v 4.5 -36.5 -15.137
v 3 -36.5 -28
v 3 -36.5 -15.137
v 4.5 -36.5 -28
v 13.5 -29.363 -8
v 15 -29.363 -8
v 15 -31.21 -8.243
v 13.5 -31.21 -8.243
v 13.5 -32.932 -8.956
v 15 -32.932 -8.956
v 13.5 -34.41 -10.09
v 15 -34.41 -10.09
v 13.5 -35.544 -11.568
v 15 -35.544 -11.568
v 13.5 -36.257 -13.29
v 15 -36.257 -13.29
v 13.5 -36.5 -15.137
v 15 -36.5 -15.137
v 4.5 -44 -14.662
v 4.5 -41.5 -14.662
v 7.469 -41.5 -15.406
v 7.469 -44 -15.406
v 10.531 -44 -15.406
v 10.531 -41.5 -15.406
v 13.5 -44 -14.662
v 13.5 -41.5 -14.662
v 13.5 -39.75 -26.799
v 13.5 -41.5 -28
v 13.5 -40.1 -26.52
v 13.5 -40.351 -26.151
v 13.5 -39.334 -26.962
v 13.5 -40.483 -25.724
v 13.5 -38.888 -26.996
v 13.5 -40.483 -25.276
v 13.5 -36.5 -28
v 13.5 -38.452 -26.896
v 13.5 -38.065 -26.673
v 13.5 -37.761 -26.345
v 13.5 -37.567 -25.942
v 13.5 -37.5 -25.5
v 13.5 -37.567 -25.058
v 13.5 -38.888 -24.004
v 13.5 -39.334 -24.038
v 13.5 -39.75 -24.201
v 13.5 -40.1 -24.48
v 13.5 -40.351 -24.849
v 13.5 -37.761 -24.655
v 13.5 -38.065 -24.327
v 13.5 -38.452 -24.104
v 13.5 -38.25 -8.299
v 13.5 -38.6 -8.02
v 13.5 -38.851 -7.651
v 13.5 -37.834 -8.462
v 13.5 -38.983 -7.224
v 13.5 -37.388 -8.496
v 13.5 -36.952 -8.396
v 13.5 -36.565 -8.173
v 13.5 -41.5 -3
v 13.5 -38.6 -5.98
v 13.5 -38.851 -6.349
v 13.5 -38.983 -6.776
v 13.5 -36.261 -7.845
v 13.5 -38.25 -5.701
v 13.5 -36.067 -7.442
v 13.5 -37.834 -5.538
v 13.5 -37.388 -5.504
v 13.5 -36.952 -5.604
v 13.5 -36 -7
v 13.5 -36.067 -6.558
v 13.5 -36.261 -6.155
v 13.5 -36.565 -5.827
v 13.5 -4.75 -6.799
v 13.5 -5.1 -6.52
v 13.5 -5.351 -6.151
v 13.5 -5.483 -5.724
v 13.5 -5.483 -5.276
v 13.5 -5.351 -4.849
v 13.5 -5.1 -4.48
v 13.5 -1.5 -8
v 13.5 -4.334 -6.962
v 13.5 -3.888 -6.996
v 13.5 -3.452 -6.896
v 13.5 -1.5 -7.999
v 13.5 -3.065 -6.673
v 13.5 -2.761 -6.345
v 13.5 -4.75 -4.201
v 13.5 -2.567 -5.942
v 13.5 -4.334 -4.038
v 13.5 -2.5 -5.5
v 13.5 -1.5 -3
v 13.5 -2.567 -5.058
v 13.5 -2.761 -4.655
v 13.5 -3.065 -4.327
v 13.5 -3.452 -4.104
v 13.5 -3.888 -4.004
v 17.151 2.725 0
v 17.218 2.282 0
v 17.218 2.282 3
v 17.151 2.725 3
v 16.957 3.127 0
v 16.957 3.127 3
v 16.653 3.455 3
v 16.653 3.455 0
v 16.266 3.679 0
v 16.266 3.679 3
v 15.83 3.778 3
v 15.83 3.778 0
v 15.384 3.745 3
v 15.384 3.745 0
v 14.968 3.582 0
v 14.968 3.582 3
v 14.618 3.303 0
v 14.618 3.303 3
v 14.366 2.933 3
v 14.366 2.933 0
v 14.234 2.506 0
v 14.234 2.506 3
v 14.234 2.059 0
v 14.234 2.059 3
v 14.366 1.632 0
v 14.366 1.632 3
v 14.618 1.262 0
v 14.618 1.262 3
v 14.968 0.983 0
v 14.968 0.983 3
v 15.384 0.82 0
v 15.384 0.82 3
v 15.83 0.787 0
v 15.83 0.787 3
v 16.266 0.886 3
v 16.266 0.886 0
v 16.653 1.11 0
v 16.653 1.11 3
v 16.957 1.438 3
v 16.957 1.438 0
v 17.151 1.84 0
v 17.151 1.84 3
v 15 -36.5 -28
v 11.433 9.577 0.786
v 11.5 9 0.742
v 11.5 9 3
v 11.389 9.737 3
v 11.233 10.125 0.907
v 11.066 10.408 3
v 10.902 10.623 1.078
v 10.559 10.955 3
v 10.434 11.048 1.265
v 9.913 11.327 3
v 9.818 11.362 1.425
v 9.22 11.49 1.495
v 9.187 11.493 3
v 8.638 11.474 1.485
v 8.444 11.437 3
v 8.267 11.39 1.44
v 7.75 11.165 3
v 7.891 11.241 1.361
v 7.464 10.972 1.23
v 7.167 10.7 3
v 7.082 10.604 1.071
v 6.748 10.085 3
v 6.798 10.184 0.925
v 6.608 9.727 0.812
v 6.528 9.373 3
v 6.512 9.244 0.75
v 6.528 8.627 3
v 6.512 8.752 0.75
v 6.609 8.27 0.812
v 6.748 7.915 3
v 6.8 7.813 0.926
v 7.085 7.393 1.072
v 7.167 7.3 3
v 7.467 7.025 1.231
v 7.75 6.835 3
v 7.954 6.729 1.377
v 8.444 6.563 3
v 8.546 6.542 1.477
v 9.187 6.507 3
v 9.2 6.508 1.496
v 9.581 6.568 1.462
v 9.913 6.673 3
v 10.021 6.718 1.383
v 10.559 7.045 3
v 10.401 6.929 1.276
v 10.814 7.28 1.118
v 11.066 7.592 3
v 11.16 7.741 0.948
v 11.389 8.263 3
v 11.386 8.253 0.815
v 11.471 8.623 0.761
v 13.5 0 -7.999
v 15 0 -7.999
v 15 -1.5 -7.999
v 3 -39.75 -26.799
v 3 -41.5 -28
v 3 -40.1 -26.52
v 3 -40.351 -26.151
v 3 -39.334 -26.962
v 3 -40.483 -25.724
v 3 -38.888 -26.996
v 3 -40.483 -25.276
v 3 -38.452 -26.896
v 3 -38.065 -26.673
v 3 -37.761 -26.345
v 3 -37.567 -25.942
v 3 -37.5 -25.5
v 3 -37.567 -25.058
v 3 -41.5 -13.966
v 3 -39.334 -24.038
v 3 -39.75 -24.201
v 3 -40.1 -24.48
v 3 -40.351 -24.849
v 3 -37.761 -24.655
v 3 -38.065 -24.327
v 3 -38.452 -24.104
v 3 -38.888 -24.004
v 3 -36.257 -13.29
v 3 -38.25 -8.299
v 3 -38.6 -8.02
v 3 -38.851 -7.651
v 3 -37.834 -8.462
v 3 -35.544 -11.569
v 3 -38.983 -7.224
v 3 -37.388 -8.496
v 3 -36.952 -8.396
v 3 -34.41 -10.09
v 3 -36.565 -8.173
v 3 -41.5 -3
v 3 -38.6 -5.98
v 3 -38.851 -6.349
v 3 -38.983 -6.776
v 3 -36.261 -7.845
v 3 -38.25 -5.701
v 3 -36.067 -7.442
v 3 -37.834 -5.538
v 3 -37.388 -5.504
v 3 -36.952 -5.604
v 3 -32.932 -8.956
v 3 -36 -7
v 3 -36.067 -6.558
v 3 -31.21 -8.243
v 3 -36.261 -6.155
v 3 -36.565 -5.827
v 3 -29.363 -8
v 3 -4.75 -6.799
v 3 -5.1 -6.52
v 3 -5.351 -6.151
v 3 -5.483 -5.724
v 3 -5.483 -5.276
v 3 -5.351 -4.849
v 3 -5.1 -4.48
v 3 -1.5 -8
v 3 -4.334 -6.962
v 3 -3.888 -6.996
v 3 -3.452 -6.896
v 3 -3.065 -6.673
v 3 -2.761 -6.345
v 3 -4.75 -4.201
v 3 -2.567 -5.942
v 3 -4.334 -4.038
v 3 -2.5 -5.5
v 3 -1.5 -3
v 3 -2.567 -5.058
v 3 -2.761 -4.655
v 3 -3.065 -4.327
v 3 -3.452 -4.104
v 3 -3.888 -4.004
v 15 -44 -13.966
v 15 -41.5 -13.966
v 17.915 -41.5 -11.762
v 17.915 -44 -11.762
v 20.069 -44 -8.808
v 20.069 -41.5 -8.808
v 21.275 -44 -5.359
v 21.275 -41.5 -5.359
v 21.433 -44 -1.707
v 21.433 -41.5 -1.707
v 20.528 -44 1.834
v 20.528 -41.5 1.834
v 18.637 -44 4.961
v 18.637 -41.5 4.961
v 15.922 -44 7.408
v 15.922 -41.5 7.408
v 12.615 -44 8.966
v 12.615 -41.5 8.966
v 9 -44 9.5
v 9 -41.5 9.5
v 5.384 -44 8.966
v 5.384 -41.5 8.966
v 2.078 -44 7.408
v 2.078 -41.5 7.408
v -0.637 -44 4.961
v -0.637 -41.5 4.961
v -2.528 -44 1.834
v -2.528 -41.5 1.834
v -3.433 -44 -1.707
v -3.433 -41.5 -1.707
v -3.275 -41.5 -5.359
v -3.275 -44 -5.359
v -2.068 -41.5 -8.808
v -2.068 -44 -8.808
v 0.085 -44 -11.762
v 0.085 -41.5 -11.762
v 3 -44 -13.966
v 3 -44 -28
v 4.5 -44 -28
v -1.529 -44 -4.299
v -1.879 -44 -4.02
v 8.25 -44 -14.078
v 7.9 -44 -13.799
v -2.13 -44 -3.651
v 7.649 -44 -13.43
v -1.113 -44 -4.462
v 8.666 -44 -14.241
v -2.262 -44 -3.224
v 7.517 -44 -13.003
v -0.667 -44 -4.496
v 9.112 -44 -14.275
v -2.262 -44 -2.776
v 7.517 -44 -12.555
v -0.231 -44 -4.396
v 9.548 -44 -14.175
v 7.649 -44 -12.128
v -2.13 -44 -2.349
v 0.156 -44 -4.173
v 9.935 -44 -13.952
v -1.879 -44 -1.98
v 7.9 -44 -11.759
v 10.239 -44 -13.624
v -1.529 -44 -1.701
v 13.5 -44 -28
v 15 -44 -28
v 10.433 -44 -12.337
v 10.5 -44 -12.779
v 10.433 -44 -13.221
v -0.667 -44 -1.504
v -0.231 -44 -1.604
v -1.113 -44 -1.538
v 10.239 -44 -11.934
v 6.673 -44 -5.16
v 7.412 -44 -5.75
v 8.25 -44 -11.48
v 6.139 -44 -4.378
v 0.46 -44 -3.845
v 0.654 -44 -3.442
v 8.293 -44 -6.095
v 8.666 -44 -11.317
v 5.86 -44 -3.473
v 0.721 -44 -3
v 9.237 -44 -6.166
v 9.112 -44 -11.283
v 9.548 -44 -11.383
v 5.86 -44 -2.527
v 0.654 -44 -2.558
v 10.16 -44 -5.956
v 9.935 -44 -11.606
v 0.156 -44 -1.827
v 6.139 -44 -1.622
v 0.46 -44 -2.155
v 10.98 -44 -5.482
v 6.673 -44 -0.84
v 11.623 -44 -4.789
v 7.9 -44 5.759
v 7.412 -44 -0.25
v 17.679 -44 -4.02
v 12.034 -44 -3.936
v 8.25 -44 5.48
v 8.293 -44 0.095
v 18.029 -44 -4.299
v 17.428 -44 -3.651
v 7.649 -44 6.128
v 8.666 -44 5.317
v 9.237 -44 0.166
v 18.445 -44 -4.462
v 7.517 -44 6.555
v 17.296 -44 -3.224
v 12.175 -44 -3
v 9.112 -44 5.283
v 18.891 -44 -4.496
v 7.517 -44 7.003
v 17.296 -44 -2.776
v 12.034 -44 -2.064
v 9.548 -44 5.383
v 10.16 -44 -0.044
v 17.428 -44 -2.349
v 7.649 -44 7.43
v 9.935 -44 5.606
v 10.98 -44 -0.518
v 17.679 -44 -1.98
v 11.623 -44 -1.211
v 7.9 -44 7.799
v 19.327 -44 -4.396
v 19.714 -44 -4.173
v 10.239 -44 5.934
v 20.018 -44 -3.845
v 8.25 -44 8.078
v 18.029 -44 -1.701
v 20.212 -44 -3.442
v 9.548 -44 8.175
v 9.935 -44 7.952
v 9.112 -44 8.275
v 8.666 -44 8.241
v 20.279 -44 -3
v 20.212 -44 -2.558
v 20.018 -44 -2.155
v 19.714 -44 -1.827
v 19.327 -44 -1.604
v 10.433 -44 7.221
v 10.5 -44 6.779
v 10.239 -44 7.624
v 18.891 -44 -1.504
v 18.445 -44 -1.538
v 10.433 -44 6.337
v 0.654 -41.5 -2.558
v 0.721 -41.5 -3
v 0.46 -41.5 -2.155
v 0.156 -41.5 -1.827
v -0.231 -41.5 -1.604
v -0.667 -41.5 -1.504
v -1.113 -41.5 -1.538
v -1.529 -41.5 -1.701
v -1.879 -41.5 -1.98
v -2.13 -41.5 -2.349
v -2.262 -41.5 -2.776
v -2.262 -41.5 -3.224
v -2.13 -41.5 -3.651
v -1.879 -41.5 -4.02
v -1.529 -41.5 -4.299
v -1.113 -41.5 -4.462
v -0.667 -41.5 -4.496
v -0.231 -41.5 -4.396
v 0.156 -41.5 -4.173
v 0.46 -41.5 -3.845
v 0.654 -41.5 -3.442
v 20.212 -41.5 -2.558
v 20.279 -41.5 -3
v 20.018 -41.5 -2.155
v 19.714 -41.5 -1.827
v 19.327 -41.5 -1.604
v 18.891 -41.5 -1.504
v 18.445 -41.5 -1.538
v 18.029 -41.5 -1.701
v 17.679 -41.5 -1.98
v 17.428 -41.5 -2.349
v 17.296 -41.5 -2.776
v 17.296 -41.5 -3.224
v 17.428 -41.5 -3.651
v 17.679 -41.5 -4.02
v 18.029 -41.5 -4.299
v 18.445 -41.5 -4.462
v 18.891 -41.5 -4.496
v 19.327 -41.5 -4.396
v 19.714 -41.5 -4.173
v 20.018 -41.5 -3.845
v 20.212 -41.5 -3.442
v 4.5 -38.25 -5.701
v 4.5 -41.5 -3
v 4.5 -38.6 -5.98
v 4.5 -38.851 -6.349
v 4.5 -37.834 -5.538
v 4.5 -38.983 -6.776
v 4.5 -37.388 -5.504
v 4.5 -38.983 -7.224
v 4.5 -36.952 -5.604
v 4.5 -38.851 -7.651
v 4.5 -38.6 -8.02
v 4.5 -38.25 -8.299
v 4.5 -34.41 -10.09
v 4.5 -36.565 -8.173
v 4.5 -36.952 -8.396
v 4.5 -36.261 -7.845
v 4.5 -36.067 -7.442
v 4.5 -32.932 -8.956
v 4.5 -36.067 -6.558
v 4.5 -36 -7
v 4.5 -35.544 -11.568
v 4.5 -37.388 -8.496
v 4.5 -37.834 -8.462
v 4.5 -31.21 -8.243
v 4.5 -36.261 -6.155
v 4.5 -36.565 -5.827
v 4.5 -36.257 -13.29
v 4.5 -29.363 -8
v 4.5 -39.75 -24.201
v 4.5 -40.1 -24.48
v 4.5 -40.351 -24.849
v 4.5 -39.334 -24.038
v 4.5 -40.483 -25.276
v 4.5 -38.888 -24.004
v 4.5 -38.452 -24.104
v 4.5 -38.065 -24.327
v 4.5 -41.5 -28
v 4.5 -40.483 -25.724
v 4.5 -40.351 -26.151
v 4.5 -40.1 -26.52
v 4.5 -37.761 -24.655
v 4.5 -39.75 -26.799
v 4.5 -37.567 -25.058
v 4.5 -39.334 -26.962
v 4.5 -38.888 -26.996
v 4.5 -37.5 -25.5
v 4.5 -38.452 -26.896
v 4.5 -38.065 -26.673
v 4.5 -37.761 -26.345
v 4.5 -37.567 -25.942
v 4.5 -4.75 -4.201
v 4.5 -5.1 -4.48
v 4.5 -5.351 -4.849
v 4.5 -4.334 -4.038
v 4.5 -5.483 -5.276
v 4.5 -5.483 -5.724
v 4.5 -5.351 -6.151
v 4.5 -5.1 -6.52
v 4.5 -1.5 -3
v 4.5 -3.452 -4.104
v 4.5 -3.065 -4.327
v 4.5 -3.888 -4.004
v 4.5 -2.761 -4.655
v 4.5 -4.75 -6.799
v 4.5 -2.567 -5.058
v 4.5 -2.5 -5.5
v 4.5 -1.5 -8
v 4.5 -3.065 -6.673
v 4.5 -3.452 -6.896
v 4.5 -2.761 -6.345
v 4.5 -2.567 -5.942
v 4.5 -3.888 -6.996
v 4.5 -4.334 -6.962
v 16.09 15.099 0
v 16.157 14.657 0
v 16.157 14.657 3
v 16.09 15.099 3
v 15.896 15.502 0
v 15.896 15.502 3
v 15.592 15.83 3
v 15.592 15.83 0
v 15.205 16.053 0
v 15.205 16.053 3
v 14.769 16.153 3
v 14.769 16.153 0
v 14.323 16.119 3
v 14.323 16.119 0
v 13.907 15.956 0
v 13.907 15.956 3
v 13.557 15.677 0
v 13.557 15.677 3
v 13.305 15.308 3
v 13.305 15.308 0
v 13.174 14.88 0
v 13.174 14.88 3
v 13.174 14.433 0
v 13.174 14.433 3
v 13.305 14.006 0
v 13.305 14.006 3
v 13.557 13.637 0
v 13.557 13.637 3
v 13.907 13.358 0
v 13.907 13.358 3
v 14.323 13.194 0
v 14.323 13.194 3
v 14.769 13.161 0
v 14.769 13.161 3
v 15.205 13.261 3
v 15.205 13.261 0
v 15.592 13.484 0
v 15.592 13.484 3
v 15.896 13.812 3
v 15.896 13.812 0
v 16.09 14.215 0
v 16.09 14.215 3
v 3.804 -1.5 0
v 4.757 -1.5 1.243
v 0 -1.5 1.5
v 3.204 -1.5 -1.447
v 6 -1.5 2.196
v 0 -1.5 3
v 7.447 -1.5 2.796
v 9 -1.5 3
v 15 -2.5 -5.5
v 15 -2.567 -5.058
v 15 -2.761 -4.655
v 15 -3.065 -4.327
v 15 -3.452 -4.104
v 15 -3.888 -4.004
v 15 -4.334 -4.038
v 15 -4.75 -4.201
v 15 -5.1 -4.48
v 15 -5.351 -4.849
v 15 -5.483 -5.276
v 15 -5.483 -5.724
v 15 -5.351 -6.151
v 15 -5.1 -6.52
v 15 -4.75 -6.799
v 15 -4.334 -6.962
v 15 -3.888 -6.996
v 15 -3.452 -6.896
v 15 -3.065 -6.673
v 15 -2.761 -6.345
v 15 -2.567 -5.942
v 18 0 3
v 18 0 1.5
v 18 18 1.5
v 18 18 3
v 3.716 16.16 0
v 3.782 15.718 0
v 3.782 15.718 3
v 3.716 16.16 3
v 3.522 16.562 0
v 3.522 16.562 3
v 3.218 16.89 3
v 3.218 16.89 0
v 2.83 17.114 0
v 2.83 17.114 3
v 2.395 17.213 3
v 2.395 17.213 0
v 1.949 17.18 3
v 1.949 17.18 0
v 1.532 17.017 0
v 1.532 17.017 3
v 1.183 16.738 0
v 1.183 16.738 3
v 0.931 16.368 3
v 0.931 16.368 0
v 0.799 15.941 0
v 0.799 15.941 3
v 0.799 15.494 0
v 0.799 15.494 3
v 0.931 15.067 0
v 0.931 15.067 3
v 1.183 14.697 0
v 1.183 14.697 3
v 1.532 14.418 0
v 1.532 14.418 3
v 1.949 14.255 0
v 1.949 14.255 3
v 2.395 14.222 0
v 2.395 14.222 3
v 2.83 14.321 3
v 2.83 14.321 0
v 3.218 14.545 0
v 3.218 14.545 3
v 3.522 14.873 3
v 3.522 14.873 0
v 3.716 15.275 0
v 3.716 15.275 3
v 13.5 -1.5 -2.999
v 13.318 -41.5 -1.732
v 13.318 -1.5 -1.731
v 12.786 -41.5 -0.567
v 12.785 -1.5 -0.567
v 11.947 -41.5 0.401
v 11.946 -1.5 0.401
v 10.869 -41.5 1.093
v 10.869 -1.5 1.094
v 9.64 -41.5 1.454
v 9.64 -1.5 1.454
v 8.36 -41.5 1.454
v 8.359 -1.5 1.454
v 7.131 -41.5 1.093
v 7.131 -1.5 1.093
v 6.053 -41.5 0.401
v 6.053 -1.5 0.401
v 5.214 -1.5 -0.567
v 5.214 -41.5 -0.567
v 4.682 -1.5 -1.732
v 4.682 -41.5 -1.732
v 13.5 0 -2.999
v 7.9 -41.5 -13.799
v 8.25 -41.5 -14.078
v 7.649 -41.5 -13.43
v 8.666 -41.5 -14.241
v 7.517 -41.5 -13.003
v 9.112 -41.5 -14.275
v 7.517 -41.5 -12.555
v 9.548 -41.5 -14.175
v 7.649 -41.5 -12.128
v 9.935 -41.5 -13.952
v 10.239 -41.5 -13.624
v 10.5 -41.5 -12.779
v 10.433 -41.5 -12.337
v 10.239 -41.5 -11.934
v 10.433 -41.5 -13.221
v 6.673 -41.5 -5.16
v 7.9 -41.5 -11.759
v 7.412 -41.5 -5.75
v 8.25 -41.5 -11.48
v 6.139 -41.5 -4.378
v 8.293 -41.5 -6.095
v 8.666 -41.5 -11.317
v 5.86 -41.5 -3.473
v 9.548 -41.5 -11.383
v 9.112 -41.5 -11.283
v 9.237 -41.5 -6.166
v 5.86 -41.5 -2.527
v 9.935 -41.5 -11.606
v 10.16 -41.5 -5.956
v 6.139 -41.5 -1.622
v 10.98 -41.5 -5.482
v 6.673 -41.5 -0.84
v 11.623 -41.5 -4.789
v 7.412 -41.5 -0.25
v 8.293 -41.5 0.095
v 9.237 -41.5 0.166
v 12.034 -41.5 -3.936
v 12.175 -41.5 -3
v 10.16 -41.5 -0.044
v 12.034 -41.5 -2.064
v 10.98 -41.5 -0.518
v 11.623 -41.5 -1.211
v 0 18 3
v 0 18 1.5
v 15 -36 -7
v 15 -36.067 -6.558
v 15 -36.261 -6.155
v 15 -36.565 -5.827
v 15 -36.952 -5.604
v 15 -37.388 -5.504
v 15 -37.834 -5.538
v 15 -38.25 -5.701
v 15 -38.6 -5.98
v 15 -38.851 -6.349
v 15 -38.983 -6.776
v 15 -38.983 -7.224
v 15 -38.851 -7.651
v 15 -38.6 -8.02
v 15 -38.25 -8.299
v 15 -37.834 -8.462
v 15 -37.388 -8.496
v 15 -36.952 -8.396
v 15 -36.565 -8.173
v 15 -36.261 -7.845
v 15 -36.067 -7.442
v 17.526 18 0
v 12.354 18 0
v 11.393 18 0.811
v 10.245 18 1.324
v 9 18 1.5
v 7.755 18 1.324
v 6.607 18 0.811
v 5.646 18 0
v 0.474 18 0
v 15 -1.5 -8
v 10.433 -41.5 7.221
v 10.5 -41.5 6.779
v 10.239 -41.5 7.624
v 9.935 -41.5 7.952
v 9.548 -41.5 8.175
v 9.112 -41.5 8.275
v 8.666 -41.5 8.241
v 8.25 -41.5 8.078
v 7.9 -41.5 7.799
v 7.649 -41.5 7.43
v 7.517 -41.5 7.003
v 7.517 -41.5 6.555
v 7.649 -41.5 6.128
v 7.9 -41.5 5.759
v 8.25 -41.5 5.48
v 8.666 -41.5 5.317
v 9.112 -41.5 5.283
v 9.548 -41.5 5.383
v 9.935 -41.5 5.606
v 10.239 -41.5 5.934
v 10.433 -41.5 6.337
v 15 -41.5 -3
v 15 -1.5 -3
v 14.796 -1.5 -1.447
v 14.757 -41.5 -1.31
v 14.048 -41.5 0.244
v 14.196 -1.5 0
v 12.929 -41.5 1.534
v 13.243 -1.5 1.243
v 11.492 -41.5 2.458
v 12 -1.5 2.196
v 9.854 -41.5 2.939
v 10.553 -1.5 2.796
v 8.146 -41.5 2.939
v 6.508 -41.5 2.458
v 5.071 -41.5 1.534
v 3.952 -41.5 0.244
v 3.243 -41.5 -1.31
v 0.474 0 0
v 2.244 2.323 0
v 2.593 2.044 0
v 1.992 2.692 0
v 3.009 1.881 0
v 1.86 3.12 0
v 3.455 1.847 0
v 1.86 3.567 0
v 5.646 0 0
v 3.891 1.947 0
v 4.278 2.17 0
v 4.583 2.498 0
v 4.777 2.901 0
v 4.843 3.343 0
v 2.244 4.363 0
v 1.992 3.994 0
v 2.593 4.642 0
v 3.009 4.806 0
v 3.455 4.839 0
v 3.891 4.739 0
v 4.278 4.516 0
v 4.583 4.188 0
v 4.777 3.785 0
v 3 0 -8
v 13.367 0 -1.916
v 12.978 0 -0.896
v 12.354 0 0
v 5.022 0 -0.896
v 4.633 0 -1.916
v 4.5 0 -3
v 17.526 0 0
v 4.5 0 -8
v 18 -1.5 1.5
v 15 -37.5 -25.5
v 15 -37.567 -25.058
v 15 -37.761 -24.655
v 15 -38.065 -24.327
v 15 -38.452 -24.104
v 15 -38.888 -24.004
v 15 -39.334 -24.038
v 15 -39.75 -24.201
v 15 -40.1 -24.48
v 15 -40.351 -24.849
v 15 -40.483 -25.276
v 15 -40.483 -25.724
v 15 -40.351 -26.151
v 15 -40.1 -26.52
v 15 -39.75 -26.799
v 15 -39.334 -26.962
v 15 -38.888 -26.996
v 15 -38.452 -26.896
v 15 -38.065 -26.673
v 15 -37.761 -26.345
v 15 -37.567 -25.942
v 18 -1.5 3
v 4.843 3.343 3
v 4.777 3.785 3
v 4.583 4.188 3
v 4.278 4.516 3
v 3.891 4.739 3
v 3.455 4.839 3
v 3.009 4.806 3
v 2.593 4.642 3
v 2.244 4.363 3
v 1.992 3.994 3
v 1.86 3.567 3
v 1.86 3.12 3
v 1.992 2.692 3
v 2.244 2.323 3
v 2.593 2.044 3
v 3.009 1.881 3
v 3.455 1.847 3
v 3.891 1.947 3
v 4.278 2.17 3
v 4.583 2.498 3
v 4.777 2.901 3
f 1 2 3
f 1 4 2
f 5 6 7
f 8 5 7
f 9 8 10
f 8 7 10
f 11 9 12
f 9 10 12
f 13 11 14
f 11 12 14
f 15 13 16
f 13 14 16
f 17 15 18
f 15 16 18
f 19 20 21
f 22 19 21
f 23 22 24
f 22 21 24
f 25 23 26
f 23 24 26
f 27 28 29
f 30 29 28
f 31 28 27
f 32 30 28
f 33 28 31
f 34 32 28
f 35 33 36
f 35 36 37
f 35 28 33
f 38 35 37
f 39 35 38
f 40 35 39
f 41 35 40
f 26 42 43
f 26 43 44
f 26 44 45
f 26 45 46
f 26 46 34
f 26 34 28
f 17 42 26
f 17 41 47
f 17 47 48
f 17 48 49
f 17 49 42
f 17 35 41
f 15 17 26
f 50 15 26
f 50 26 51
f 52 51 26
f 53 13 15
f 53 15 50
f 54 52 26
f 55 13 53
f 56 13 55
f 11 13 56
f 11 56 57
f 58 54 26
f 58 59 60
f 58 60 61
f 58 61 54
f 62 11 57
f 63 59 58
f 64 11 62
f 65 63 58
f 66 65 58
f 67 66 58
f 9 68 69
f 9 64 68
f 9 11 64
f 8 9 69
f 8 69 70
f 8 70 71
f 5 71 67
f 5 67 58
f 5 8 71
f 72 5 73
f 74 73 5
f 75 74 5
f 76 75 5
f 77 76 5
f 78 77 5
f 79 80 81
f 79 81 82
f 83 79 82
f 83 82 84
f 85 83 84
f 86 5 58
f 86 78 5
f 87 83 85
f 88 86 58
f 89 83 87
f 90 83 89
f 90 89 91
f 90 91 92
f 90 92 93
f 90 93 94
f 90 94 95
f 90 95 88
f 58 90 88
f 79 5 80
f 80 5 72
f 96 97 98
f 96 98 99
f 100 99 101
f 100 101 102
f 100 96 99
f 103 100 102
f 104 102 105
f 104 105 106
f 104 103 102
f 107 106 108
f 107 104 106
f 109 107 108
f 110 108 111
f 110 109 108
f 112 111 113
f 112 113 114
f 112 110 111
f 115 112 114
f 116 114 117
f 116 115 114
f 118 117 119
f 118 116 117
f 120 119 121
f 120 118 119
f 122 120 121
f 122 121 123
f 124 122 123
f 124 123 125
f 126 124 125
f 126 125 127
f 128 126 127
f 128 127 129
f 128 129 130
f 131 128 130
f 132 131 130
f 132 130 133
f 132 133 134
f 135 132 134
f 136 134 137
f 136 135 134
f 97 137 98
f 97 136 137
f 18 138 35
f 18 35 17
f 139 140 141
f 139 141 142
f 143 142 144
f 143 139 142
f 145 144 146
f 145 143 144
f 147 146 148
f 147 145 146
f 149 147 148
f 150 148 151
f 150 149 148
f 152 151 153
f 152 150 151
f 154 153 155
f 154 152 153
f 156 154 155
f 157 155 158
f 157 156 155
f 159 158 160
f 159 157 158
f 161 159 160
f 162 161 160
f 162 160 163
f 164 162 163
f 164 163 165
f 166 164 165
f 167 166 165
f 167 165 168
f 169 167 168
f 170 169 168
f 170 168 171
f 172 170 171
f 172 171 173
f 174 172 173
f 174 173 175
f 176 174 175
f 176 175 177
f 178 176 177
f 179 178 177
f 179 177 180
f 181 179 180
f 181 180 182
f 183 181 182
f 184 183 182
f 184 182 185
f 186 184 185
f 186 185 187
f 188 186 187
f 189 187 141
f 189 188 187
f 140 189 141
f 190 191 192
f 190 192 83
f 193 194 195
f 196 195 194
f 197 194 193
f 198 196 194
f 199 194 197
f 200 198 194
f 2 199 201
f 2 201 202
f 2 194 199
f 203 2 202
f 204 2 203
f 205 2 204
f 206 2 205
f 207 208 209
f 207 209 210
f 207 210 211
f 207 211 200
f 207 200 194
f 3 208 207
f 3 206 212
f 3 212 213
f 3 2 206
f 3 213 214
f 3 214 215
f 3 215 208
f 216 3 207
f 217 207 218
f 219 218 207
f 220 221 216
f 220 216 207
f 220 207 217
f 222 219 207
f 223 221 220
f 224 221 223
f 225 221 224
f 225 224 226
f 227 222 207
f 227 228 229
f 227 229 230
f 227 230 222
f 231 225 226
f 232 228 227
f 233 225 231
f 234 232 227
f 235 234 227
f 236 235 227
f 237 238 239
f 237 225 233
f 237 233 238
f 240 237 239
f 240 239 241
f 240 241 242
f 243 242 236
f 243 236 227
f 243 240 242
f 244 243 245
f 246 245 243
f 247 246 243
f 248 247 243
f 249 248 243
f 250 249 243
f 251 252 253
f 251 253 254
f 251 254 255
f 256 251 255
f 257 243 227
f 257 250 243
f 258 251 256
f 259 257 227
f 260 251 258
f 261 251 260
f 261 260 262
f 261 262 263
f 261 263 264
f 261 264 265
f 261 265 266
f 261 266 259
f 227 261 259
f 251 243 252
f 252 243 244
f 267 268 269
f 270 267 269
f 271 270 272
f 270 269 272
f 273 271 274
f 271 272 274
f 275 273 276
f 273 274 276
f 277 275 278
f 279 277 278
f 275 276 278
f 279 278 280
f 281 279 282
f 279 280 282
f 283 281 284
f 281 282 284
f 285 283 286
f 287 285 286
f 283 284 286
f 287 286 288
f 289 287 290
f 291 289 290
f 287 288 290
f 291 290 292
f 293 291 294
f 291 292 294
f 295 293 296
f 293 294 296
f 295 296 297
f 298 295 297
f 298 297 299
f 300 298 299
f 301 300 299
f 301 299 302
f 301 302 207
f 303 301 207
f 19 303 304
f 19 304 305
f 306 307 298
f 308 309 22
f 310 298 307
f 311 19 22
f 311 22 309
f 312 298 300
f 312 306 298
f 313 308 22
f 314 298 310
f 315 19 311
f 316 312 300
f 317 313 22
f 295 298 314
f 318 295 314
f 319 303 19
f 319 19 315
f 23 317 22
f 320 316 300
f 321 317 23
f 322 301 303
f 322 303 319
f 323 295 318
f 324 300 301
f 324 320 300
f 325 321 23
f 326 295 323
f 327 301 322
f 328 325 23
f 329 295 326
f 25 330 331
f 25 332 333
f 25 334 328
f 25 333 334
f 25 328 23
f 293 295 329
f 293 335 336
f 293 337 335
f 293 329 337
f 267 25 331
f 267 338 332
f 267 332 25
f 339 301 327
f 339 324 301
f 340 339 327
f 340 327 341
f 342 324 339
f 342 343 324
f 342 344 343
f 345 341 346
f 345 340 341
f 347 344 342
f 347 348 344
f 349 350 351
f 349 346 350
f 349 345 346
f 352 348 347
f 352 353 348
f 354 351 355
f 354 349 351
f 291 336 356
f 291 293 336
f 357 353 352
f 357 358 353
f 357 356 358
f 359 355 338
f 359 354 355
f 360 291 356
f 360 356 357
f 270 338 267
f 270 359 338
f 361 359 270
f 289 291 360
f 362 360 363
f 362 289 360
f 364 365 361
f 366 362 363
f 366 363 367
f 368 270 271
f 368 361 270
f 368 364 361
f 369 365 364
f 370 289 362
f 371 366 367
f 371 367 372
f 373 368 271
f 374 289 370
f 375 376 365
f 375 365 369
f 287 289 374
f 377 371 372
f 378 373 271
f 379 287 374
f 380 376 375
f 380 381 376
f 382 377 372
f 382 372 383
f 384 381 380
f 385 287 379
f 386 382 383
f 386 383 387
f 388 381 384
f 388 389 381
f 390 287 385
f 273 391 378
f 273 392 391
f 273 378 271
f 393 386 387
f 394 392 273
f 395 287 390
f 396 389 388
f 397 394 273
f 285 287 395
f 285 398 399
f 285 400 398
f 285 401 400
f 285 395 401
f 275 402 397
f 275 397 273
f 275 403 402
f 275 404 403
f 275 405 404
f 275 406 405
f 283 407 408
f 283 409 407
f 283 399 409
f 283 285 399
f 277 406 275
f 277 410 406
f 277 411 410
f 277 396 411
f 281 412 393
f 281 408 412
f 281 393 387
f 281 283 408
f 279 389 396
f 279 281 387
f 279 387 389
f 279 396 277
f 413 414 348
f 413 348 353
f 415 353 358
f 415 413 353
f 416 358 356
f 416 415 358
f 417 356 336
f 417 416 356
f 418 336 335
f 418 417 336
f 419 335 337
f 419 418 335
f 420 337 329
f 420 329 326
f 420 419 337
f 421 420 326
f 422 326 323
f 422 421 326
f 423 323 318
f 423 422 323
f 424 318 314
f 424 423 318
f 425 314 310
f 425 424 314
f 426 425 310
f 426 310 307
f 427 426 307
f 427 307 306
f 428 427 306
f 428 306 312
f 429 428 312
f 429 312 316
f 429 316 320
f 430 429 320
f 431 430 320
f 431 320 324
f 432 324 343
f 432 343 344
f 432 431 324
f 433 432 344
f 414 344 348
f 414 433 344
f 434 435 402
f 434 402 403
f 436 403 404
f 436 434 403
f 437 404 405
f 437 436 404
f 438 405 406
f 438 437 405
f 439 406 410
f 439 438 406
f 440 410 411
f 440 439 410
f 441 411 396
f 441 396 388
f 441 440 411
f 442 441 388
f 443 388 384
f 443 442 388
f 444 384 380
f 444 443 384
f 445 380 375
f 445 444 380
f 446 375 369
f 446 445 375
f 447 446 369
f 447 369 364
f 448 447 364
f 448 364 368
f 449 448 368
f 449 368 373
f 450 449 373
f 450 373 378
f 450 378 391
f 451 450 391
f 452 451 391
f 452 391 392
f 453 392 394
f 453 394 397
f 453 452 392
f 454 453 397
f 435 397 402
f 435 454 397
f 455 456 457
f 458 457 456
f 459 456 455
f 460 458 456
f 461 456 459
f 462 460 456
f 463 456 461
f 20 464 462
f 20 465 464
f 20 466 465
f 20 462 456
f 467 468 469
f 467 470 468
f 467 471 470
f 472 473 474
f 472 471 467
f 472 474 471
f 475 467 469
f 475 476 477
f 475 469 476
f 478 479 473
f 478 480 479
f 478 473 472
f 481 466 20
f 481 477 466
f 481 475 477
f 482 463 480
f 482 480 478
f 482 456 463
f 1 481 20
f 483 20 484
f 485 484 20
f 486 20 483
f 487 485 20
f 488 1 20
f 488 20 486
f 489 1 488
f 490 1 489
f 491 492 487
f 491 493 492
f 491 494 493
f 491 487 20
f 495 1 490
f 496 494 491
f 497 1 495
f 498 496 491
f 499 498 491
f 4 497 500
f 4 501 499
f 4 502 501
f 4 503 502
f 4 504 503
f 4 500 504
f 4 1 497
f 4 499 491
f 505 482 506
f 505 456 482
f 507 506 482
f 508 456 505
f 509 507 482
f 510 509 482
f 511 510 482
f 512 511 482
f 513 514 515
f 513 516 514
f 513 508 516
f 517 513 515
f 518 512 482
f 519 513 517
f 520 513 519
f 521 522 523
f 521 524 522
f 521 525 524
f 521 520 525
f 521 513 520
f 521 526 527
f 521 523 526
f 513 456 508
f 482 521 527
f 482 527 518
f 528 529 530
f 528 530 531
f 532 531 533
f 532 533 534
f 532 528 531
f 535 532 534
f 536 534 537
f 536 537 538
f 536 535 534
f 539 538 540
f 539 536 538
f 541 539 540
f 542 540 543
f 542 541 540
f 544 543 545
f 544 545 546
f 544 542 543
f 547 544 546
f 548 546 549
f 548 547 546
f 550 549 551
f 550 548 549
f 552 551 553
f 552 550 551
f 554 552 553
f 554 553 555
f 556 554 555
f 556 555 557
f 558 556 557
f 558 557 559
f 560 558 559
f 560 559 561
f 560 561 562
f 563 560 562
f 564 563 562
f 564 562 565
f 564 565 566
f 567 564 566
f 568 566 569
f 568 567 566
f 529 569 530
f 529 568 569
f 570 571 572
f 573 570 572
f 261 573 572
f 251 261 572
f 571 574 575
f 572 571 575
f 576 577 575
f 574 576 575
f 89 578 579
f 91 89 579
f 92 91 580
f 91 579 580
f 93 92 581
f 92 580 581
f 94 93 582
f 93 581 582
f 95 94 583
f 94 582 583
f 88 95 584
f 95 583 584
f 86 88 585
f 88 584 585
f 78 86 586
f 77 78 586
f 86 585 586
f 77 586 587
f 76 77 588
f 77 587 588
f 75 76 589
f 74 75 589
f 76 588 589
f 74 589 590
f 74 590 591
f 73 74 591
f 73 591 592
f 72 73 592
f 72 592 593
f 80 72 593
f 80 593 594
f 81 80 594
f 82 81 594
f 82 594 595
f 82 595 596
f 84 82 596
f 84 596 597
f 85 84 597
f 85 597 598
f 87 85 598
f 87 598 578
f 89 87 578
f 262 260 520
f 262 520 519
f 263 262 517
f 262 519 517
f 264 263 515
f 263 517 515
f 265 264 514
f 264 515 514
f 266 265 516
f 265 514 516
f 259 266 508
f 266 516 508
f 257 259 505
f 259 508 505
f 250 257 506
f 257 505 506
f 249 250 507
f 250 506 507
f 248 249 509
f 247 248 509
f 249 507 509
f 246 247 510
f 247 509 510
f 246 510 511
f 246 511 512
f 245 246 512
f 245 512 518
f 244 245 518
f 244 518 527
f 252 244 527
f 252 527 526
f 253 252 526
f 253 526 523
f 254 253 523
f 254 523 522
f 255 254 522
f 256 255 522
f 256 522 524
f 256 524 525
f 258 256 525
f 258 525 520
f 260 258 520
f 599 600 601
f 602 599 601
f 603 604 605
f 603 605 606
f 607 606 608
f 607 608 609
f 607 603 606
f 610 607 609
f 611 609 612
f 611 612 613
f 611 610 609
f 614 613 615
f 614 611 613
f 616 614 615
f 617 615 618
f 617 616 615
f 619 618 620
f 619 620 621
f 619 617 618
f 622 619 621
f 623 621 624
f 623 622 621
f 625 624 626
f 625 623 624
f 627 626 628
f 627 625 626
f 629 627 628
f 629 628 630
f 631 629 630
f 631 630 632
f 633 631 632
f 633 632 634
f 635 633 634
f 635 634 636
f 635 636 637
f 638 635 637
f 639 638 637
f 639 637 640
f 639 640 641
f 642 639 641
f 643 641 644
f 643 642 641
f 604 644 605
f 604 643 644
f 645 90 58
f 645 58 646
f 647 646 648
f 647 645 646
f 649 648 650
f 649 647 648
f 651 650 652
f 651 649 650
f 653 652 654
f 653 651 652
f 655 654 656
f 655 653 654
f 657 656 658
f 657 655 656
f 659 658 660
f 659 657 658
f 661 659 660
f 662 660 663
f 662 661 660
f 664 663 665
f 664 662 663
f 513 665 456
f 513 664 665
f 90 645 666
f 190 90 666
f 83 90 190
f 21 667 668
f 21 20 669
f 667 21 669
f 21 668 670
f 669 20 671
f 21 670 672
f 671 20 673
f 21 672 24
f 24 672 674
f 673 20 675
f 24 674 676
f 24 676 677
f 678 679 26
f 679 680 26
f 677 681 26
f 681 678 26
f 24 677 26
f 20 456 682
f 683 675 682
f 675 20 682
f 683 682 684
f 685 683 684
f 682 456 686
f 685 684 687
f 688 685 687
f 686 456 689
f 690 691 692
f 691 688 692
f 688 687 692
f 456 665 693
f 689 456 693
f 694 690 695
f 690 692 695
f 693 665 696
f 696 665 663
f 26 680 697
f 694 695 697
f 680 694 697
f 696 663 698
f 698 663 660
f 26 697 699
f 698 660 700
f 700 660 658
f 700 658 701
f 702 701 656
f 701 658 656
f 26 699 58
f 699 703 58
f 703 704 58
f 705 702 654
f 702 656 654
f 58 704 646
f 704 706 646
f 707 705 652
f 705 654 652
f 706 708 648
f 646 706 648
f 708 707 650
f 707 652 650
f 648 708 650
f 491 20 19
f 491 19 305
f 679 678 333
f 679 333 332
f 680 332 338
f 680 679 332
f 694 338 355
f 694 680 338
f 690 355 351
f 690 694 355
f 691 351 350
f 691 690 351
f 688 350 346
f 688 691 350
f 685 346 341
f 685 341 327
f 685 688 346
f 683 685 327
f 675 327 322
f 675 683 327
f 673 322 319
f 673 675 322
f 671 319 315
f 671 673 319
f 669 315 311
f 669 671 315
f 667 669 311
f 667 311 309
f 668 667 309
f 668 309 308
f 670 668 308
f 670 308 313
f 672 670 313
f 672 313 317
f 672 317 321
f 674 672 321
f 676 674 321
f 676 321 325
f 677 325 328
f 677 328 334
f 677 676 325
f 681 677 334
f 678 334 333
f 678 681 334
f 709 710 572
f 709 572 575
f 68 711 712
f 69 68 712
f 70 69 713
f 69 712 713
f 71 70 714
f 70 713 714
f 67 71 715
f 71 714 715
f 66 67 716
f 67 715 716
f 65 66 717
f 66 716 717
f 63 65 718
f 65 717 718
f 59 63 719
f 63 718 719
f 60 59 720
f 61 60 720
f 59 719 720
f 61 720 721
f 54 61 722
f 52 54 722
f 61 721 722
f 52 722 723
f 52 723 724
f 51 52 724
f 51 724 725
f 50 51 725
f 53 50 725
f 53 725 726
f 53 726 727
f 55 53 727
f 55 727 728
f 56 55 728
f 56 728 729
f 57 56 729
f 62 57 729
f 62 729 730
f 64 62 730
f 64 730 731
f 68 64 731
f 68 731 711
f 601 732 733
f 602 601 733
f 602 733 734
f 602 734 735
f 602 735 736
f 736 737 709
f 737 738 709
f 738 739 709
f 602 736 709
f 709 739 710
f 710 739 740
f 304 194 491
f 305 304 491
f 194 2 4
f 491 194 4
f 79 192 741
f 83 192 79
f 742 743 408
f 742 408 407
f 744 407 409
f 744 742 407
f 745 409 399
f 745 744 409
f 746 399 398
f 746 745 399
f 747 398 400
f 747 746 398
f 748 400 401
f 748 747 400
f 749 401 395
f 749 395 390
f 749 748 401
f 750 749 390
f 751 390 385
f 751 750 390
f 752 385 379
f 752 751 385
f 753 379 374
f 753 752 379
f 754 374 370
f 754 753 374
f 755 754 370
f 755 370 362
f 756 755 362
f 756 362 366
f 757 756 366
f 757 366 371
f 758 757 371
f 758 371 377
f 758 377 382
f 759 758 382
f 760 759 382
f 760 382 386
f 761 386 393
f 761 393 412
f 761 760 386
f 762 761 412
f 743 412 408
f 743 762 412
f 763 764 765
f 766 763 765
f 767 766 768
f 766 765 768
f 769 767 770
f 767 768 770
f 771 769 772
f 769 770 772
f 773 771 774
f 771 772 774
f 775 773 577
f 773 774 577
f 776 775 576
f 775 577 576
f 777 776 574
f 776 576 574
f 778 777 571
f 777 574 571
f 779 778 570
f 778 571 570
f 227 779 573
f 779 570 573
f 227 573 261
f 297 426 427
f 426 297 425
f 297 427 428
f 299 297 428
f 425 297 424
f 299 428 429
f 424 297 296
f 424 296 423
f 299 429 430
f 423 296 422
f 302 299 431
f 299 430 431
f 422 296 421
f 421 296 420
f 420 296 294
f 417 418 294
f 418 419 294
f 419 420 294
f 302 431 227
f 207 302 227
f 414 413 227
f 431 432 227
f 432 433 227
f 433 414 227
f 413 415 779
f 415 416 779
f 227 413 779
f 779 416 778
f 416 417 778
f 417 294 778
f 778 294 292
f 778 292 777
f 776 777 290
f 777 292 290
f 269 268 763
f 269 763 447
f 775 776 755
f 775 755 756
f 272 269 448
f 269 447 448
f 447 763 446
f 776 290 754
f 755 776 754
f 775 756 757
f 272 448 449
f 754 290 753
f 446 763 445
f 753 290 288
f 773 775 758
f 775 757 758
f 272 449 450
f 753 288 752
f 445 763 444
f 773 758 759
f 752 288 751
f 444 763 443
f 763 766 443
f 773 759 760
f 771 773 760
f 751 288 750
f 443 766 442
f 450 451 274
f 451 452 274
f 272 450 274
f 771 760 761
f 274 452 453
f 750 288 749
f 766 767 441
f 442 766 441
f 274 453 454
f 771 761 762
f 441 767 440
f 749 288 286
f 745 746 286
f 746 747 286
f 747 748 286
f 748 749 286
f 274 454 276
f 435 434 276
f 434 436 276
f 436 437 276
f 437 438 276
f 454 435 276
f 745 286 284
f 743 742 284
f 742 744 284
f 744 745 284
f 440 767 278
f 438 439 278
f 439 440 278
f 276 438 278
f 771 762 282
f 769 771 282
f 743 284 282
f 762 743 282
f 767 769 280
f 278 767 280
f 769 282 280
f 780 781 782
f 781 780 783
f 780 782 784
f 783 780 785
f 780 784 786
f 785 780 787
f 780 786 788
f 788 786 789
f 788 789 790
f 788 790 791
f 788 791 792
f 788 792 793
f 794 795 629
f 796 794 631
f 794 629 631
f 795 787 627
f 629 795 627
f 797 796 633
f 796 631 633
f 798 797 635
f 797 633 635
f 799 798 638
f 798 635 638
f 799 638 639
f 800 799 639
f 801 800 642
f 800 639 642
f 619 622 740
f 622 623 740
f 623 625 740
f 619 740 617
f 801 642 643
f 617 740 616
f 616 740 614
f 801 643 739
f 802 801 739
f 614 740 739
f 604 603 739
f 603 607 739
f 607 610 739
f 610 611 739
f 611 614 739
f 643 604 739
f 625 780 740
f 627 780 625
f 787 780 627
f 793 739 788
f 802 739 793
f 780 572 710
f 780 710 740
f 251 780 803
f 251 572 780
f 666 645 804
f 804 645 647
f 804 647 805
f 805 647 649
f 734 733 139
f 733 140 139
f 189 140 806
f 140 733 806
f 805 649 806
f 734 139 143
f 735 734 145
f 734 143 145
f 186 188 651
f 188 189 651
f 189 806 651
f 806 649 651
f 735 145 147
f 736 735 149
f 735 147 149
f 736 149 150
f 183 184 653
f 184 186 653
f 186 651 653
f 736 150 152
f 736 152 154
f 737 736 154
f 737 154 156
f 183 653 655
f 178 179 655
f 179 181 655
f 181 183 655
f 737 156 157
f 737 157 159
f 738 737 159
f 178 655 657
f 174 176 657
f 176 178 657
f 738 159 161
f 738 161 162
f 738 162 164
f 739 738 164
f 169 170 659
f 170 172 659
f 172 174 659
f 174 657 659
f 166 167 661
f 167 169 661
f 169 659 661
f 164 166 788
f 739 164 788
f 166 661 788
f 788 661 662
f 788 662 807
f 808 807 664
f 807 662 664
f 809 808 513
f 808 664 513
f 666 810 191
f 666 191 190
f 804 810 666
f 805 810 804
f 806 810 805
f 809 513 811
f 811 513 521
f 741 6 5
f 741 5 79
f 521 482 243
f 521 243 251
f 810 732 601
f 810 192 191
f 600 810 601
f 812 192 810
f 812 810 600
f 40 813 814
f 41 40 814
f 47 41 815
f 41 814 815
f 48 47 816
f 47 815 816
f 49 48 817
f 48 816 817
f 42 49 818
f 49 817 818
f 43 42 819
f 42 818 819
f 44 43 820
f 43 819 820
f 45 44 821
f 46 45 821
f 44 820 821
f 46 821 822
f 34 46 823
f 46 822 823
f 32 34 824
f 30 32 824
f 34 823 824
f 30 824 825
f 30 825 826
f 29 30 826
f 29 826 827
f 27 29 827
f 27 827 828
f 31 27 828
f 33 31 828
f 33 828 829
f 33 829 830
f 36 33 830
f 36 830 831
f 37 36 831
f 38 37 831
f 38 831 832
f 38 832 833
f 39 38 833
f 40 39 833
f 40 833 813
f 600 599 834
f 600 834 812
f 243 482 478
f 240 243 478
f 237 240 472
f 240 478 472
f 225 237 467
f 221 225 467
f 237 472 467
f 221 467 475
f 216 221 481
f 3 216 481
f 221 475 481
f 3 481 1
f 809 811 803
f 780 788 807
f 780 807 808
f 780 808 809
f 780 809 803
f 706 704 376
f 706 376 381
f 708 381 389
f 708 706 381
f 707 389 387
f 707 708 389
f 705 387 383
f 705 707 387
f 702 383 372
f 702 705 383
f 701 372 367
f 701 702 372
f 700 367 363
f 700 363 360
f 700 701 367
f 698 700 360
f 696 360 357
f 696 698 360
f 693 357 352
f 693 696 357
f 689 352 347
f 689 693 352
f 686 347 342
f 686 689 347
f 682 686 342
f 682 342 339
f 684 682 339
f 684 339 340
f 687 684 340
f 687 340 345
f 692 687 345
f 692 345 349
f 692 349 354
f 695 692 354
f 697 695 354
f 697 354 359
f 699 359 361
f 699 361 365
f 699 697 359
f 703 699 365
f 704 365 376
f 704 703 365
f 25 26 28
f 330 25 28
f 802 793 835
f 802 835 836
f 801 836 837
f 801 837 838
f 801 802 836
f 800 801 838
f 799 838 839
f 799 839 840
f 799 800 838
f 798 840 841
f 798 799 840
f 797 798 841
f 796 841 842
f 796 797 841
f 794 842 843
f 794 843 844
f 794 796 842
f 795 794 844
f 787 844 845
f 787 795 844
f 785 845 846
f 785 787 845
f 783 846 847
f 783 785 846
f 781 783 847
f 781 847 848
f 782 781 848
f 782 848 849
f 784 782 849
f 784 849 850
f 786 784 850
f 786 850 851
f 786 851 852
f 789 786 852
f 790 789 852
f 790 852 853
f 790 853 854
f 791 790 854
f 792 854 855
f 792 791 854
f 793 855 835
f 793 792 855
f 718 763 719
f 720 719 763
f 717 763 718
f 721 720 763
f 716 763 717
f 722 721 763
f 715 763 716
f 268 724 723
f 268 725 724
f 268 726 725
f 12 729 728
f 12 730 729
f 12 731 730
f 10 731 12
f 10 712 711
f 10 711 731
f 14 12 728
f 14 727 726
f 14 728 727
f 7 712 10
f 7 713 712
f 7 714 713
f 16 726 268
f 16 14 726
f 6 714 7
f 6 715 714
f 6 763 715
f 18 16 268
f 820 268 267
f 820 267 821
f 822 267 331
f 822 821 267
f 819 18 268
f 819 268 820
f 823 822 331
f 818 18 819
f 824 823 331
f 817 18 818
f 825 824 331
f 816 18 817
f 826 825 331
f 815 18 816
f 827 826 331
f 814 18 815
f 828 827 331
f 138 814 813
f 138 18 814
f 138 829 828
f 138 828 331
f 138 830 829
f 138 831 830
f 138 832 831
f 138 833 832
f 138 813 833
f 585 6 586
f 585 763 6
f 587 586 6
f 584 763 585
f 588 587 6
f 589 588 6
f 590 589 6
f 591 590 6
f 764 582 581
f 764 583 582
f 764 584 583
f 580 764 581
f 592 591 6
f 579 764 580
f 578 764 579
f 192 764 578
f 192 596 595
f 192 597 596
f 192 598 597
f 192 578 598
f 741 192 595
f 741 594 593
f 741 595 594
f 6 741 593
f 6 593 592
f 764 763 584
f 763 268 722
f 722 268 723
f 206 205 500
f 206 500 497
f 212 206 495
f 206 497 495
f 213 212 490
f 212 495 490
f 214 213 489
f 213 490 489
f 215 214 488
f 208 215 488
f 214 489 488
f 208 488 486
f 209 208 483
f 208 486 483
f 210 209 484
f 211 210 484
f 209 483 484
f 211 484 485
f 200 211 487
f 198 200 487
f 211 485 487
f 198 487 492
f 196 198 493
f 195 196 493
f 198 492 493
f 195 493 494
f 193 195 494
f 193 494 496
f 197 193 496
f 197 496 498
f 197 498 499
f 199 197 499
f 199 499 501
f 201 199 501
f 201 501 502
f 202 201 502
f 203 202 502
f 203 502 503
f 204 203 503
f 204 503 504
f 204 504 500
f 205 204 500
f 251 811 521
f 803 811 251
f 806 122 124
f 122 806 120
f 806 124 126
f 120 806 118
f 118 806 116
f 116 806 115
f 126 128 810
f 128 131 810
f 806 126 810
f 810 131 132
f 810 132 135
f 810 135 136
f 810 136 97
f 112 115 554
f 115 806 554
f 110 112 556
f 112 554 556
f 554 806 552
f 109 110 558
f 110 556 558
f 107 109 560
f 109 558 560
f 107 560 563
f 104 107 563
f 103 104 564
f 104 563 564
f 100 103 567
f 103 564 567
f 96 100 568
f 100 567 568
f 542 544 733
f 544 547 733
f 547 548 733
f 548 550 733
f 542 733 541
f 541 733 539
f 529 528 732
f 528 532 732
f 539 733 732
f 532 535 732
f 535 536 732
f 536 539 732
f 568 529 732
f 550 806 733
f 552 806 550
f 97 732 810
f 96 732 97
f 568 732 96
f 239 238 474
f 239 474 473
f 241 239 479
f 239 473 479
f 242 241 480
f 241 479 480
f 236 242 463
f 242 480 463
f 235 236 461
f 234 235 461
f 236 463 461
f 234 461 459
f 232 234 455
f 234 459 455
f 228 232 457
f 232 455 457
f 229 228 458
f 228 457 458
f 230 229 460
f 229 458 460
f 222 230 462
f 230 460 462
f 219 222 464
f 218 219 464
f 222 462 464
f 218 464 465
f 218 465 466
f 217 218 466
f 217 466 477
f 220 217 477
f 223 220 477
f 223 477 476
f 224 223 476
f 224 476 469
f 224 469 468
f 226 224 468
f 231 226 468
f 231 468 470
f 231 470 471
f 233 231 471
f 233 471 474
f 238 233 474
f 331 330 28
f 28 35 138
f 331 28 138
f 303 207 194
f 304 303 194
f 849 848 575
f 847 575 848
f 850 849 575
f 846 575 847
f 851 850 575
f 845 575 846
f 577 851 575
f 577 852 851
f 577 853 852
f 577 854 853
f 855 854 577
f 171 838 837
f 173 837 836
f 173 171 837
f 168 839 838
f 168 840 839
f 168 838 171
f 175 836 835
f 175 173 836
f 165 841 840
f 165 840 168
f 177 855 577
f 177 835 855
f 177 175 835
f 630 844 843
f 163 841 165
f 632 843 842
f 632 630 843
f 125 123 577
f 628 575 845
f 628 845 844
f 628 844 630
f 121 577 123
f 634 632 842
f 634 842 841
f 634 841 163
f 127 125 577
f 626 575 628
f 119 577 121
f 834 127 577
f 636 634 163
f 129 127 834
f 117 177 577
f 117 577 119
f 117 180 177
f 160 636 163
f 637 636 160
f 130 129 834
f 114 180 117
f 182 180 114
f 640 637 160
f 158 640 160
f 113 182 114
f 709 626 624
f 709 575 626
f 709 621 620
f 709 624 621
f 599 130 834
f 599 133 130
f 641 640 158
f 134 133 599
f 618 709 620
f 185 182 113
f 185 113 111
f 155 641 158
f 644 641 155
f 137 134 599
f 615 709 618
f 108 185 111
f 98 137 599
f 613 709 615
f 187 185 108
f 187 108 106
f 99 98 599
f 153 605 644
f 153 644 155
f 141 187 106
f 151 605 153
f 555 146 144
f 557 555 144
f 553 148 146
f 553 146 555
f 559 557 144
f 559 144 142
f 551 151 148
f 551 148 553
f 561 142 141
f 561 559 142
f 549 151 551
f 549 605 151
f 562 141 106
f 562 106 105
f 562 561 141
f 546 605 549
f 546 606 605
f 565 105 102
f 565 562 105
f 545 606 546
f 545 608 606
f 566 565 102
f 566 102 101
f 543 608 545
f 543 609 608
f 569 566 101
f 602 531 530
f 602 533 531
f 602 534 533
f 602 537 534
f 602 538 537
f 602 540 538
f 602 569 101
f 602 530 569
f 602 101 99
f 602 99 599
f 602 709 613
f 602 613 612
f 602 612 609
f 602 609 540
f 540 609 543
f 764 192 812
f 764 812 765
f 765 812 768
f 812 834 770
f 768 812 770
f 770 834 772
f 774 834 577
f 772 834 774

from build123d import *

# Parameters (mm, degrees)
SKETCH_R        = 1.5
SKETCH_R_2      = 2.5
PAD_DEPTH       = 3
PAD001_DEPTH    = 1.5
PAD002_DEPTH    = 40
SKETCH005_R     = 1.5
POCKET_DEPTH    = 13
POCKET001_DEPTH = 25
POCKET002_DEPTH = 25
SKETCH007_R     = 3.175
SKETCH007_R_2   = 1.5
PAD003_DEPTH    = 2.5


with BuildPart() as part:
    # Sketch → Pad (new body)
    with BuildSketch(Plane.XY):
        Polygon((0, 0), (18, 0), (18, 18), (0, 18), (0, 10.5), (0, 7.5), align=None)
        with Locations((2.2824855787, 15.7175144213)):
            Circle(SKETCH_R, mode=Mode.SUBTRACT)
        with Locations((14.6568542495, 14.6568542495)):
            Circle(SKETCH_R, mode=Mode.SUBTRACT)
        with Locations((3.3431457505, 3.3431457505)):
            Circle(SKETCH_R, mode=Mode.SUBTRACT)
        with Locations((15.7175144213, 2.2824855787)):
            Circle(SKETCH_R, mode=Mode.SUBTRACT)
        with Locations((9, 9)):
            Circle(SKETCH_R_2, mode=Mode.SUBTRACT)
    extrude(amount=PAD_DEPTH)

    # Sketch002 → Pad001 (new body)
    with BuildSketch(Plane.XZ):
        Polygon((0, 3), (18, 3), (17.9999999631, -7.9988470638), (0, -8), align=None)
    extrude(amount=PAD001_DEPTH)

    # Sketch001 → Pad002 (new body)
    with BuildSketch(Plane.XZ.offset(1.5)):
        with BuildLine():
            ThreePointArc((13.5, -3), (9, 1.5), (4.5, -3))
            Line((4.5, -3), (4.5001284117, -27.9999999997))
            Line((4.5001284117, -27.9999999997), (3.0001284117, -27.9999999997))
            Line((3.0001284117, -27.9999999997), (3, -3))
            ThreePointArc((15, -3), (9, 3), (3, -3))
            Line((15, -3), (15.0001284117, -27.9999999997))
            Line((15.0001284117, -27.9999999997), (13.5001284117, -27.9999999997))
            Line((13.5001284117, -27.9999999997), (13.5, -3))
        make_face()
    extrude(amount=PAD002_DEPTH)

    # Sketch005 → Pocket (cut)
    with BuildSketch(Plane(origin=(14.9999845902, 0, 7.70469e-05), x_dir=(0, 1, 0), z_dir=(1, 0, 5.1365e-06))):
        with Locations((-4, -5.500077047)):
            Circle(SKETCH005_R)
        with Locations((-37.5, -7.000077047)):
            Circle(SKETCH005_R)
        with Locations((-39, -25.500077047)):
            Circle(SKETCH005_R)
        with BuildLine():
            Line((-36.5, -28.000077047), (-36.4999999999, -15.1369541066))
            ThreePointArc((-29.3631590976, -8.000077047), (-34.4096804325, -10.0904221815), (-36.4999999999, -15.1369541066))
            Line((-29.3631590976, -8.000077047), (-1.4999991941, -8.000077047))
            Line((-1.5, -28.000077047), (-1.4999991941, -8.000077047))
            Line((-36.5, -28.000077047), (-1.5, -28.000077047))
        make_face()
    extrude(amount=-POCKET_DEPTH, mode=Mode.SUBTRACT)

    # Sketch006 → Pocket001 (cut)
    with BuildSketch(Plane.XZ.offset(1.5)):
        Polygon((0, 1.5), (2.9999999938, -7.999807844), (0, -8), align=None)
        Polygon((17.9999999631, -7.9988470638), (14.9999999692, -7.9990392199), (17.999999995, 1.5), align=None)
    extrude(amount=-POCKET001_DEPTH, mode=Mode.SUBTRACT)

    # Sketch008 → Pocket002 (cut)
    with BuildSketch(Plane.XZ.offset(1.5)):
        with BuildLine():
            Line((4.5000000092, -2.9997117644), (4.5000256809, -7.9997117643))
            Line((4.5000256809, -7.9997117643), (13.5000256779, -7.9991352962))
            Line((13.4999999169, -2.9991352963), (13.5000256779, -7.9991352962))
            ThreePointArc((13.4999999169, -2.9991352963), (8.999711766, 1.4999999908), (4.5000000092, -2.9997117644))
        make_face()
    extrude(amount=-POCKET002_DEPTH, mode=Mode.SUBTRACT)

    # Sketch007 → Pad003 (new body)
    with BuildSketch(Plane.XZ.offset(41.5)):
        with BuildLine():
            ThreePointArc((15.0000563256, -13.9658252808), (8.9999357942, 9.4999999998), (3.0000563259, -13.9658869184))
            Line((3.0000563259, -13.9658869184), (3.0001284117, -27.9999999997))
            Line((3.0001284117, -27.9999999997), (4.5001284117, -27.9999999997))
            Line((4.5000599011, -14.6619269037), (4.5001284117, -27.9999999997))
            ThreePointArc((4.5000599011, -14.6619269037), (9.0000642058, -15.4999999998), (13.5000599009, -14.6618806755))
            Line((13.5000599009, -14.6618806755), (13.5001284117, -27.9999999997))
            Line((13.5001284117, -27.9999999997), (15.0001284117, -27.9999999997))
            Line((15.0000563256, -13.9658252808), (15.0001284117, -27.9999999997))
        make_face()
        with Locations((9, -3)):
            Circle(SKETCH007_R, mode=Mode.SUBTRACT)
        with Locations((-0.779, -3)):
            Circle(SKETCH007_R_2, mode=Mode.SUBTRACT)
        with Locations((9, -12.779)):
            Circle(SKETCH007_R_2, mode=Mode.SUBTRACT)
        with Locations((9, 6.779)):
            Circle(SKETCH007_R_2, mode=Mode.SUBTRACT)
        with Locations((18.779, -3)):
            Circle(SKETCH007_R_2, mode=Mode.SUBTRACT)
    extrude(amount=PAD003_DEPTH)


solid = part.part
